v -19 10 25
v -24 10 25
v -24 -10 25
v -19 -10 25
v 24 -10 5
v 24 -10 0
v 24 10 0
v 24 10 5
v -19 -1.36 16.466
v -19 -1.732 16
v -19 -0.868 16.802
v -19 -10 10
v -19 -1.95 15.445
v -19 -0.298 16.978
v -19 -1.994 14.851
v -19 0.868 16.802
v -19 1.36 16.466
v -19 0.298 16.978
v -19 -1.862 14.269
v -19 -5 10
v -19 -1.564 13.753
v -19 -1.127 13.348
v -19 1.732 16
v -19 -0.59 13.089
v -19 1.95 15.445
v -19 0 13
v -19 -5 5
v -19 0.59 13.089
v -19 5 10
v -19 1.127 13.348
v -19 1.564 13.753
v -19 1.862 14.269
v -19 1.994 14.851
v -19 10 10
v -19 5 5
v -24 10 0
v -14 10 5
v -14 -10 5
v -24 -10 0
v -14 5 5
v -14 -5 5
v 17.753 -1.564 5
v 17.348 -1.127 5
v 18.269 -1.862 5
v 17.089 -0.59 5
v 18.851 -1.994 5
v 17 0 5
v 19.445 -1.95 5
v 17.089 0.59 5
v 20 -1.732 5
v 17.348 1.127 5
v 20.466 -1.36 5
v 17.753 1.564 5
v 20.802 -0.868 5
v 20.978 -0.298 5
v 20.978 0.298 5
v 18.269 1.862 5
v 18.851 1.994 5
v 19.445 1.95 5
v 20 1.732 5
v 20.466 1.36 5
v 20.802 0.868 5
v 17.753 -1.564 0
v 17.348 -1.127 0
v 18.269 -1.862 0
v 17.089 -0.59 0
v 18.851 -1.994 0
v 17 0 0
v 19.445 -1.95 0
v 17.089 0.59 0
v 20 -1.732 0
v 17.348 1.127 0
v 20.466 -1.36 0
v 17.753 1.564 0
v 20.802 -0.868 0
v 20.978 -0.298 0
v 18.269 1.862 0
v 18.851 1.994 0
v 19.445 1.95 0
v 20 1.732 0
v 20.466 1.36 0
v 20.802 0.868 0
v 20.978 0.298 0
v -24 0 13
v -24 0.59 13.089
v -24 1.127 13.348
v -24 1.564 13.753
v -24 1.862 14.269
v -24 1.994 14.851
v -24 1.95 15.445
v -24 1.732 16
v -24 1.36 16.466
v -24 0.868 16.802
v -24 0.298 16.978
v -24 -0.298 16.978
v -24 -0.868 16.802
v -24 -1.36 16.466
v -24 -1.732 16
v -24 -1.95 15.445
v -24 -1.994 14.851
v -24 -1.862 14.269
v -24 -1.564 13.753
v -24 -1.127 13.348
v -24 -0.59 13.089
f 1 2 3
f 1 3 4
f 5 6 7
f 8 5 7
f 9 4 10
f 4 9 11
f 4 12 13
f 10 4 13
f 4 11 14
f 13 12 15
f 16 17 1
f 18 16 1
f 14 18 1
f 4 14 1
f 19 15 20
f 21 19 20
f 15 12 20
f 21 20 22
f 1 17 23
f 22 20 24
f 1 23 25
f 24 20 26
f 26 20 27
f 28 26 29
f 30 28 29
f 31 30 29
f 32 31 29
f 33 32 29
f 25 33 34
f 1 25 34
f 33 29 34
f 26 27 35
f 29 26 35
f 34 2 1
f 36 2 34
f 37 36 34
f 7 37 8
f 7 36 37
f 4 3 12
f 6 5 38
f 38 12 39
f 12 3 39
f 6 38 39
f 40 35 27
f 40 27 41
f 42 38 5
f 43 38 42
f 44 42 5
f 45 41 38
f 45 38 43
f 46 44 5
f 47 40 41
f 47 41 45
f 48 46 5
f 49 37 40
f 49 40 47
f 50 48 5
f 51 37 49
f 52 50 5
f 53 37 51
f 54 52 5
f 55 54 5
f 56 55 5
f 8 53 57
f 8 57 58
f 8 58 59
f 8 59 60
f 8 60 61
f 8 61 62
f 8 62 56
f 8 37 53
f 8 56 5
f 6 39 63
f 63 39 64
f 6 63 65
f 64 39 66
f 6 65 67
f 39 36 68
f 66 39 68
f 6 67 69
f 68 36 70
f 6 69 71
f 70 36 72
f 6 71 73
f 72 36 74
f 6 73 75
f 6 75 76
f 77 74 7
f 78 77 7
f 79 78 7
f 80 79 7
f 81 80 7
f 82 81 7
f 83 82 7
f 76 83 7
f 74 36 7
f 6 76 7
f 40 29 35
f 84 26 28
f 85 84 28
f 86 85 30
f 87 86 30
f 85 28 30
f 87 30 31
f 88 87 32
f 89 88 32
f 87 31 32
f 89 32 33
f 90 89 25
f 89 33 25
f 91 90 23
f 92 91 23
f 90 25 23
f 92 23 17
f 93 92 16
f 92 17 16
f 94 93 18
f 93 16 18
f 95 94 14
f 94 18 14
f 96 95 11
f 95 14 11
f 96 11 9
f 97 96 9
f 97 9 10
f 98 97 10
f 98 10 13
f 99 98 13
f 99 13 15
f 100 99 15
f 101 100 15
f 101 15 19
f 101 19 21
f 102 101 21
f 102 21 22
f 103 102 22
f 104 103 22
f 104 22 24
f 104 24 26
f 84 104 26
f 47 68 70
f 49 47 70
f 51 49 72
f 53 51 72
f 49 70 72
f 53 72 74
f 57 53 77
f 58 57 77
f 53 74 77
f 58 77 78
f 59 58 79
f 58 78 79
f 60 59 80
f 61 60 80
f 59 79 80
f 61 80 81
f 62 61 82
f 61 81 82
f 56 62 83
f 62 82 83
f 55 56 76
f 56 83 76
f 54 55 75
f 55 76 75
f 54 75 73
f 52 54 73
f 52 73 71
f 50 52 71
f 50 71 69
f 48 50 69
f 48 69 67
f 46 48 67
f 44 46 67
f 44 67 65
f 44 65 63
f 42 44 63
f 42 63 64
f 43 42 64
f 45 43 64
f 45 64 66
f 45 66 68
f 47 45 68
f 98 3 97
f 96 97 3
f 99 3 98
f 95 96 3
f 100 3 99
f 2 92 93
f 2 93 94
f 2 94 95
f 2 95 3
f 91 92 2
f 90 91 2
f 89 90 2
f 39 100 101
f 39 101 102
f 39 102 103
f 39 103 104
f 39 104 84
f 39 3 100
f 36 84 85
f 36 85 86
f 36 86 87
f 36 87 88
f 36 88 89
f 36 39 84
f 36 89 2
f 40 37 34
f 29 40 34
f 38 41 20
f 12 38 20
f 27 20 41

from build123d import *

# Parameters (mm, degrees)
SKETCH1_W           = 48
SKETCH1_H           = 20
BOSS_EXTRUDE1_DEPTH = 5
SKETCH2_W           = 5
SKETCH2_H           = 20
BOSS_EXTRUDE2_DEPTH = 20
SKETCH3_R           = 2
CUT_EXTRUDE1_DEPTH  = 51.734603576
SKETCH5_W           = 5
SKETCH5_H           = 5
BOSS_EXTRUDE3_DEPTH = 5
CUT_EXTRUDE3_DEPTH  = 41.012498047
SKETCH7_R           = 2
CUT_EXTRUDE4_DEPTH  = 37.069377594


with BuildPart() as part:
    # Sketch1 → Boss-Extrude1 (new body)
    with BuildSketch(Plane.XY):
        Rectangle(SKETCH1_W, SKETCH1_H)
    extrude(amount=BOSS_EXTRUDE1_DEPTH)

    # Sketch2 → Boss-Extrude2 (add)
    with BuildSketch(Plane.XY.offset(5)):
        with Locations((-21.5, 0)):
            Rectangle(SKETCH2_W, SKETCH2_H)
    extrude(amount=BOSS_EXTRUDE2_DEPTH)

    # Sketch3 → Cut-Extrude1 (cut, through all)
    with BuildSketch(Plane(origin=(-19, 0, 0), x_dir=(0, 0, -1), z_dir=(1, 0, 0))):
        with Locations((-15, 0)):
            Circle(SKETCH3_R)
    extrude(amount=-CUT_EXTRUDE1_DEPTH, mode=Mode.SUBTRACT)

    # Sketch5 → Boss-Extrude3 (add)
    with BuildSketch(Plane(origin=(-19, 0, 0), x_dir=(0, 0, -1), z_dir=(1, 0, 0))):
        with Locations((-7.5, -7.5)):
            Rectangle(SKETCH5_W, SKETCH5_H)
        with Locations((-7.5, 7.5)):
            Rectangle(SKETCH5_W, SKETCH5_H)
    extrude(amount=BOSS_EXTRUDE3_DEPTH)

    # Sketch6 → Cut-Extrude3 (cut, through all)
    with BuildSketch(Plane(origin=(0, 10, 0), x_dir=(1, 0, 0), z_dir=(0, 1, 0))):
        Polygon((-14, -5), (-19, -10), (-14, -10), align=None)
    extrude(amount=-CUT_EXTRUDE3_DEPTH, mode=Mode.SUBTRACT)

    # Sketch7 → Cut-Extrude4 (cut, through all)
    with BuildSketch(Plane(origin=(0, 0, 0), x_dir=(-1, 0, 0), z_dir=(0, 0, -1))):
        with Locations((-19, 0)):
            Circle(SKETCH7_R)
    extrude(amount=-CUT_EXTRUDE4_DEPTH, mode=Mode.SUBTRACT)


solid = part.part
